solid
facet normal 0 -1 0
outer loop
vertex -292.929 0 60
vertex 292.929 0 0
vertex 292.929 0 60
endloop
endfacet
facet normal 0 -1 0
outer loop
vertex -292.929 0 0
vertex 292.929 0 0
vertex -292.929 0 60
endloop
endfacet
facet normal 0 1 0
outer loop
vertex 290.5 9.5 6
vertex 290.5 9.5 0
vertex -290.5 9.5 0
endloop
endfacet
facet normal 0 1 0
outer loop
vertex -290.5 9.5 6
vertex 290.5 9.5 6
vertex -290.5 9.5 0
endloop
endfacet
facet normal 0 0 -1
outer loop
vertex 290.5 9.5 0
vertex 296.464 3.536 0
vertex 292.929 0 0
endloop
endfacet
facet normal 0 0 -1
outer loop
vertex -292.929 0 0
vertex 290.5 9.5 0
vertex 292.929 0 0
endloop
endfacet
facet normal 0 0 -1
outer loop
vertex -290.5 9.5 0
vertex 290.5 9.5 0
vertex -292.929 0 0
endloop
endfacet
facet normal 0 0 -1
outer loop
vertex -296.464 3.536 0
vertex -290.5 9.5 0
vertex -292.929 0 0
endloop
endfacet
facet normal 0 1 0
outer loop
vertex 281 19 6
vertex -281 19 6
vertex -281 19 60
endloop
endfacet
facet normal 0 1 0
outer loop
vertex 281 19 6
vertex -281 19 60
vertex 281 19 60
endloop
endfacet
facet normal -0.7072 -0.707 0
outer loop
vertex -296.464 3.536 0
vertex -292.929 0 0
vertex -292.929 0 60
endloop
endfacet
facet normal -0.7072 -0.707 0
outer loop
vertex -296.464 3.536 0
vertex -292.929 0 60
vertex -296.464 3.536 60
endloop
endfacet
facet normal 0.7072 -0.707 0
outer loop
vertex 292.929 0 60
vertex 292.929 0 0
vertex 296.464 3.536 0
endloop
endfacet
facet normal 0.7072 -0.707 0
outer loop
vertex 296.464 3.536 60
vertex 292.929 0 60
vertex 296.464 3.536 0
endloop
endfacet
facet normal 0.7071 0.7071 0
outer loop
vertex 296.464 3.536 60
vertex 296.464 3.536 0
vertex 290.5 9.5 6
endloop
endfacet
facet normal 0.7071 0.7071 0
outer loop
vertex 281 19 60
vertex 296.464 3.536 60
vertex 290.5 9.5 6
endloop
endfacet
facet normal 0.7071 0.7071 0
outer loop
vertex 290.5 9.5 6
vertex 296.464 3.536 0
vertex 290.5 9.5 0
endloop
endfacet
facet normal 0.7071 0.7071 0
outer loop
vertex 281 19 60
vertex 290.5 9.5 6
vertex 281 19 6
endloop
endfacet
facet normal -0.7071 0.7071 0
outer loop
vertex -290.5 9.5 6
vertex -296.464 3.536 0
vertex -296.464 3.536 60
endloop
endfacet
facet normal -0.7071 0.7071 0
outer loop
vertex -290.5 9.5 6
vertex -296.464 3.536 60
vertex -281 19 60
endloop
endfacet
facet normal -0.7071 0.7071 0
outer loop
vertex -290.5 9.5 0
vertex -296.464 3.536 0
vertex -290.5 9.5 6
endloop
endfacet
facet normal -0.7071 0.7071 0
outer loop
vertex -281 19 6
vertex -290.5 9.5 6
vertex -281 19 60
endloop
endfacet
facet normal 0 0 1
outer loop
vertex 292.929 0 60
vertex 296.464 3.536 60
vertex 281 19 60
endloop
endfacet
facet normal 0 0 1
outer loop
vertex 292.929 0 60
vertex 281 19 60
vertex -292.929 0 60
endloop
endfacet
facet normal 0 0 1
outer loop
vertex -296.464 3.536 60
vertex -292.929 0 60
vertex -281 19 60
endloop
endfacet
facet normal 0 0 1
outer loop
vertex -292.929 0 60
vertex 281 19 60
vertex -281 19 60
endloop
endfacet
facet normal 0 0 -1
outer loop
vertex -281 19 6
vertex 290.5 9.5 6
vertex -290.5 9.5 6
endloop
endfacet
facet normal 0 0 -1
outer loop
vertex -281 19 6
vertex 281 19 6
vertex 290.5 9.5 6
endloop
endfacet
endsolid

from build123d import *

# Parameters (mm, degrees)
F1_DEPTH = 60
F2_DEPTH = 6


with BuildPart() as f1:
    # F0 (on Top) → F1 (new body)
    with BuildSketch(Plane.XY):
        Polygon((0, 9.5), (0, 0), (292.9289321881, 0), (296.4644660941, 3.5355339059), (290.5, 9.5), align=None)
        Polygon((0, 19), (0, 9.5), (290.5, 9.5), (281, 19), align=None)
    extrude(amount=F1_DEPTH)

    # F0 (on Top) → F2 (cut)
    with BuildSketch(Plane.XY):
        Polygon((0, 19), (0, 9.5), (290.5, 9.5), (281, 19), align=None)
    extrude(amount=F2_DEPTH, mode=Mode.SUBTRACT)

    # F3: F1 across plane


with BuildPart() as f1_1:
    add(f1.part)
    add(f1.part.mirror(Plane.YZ))


solid = f1_1.part
